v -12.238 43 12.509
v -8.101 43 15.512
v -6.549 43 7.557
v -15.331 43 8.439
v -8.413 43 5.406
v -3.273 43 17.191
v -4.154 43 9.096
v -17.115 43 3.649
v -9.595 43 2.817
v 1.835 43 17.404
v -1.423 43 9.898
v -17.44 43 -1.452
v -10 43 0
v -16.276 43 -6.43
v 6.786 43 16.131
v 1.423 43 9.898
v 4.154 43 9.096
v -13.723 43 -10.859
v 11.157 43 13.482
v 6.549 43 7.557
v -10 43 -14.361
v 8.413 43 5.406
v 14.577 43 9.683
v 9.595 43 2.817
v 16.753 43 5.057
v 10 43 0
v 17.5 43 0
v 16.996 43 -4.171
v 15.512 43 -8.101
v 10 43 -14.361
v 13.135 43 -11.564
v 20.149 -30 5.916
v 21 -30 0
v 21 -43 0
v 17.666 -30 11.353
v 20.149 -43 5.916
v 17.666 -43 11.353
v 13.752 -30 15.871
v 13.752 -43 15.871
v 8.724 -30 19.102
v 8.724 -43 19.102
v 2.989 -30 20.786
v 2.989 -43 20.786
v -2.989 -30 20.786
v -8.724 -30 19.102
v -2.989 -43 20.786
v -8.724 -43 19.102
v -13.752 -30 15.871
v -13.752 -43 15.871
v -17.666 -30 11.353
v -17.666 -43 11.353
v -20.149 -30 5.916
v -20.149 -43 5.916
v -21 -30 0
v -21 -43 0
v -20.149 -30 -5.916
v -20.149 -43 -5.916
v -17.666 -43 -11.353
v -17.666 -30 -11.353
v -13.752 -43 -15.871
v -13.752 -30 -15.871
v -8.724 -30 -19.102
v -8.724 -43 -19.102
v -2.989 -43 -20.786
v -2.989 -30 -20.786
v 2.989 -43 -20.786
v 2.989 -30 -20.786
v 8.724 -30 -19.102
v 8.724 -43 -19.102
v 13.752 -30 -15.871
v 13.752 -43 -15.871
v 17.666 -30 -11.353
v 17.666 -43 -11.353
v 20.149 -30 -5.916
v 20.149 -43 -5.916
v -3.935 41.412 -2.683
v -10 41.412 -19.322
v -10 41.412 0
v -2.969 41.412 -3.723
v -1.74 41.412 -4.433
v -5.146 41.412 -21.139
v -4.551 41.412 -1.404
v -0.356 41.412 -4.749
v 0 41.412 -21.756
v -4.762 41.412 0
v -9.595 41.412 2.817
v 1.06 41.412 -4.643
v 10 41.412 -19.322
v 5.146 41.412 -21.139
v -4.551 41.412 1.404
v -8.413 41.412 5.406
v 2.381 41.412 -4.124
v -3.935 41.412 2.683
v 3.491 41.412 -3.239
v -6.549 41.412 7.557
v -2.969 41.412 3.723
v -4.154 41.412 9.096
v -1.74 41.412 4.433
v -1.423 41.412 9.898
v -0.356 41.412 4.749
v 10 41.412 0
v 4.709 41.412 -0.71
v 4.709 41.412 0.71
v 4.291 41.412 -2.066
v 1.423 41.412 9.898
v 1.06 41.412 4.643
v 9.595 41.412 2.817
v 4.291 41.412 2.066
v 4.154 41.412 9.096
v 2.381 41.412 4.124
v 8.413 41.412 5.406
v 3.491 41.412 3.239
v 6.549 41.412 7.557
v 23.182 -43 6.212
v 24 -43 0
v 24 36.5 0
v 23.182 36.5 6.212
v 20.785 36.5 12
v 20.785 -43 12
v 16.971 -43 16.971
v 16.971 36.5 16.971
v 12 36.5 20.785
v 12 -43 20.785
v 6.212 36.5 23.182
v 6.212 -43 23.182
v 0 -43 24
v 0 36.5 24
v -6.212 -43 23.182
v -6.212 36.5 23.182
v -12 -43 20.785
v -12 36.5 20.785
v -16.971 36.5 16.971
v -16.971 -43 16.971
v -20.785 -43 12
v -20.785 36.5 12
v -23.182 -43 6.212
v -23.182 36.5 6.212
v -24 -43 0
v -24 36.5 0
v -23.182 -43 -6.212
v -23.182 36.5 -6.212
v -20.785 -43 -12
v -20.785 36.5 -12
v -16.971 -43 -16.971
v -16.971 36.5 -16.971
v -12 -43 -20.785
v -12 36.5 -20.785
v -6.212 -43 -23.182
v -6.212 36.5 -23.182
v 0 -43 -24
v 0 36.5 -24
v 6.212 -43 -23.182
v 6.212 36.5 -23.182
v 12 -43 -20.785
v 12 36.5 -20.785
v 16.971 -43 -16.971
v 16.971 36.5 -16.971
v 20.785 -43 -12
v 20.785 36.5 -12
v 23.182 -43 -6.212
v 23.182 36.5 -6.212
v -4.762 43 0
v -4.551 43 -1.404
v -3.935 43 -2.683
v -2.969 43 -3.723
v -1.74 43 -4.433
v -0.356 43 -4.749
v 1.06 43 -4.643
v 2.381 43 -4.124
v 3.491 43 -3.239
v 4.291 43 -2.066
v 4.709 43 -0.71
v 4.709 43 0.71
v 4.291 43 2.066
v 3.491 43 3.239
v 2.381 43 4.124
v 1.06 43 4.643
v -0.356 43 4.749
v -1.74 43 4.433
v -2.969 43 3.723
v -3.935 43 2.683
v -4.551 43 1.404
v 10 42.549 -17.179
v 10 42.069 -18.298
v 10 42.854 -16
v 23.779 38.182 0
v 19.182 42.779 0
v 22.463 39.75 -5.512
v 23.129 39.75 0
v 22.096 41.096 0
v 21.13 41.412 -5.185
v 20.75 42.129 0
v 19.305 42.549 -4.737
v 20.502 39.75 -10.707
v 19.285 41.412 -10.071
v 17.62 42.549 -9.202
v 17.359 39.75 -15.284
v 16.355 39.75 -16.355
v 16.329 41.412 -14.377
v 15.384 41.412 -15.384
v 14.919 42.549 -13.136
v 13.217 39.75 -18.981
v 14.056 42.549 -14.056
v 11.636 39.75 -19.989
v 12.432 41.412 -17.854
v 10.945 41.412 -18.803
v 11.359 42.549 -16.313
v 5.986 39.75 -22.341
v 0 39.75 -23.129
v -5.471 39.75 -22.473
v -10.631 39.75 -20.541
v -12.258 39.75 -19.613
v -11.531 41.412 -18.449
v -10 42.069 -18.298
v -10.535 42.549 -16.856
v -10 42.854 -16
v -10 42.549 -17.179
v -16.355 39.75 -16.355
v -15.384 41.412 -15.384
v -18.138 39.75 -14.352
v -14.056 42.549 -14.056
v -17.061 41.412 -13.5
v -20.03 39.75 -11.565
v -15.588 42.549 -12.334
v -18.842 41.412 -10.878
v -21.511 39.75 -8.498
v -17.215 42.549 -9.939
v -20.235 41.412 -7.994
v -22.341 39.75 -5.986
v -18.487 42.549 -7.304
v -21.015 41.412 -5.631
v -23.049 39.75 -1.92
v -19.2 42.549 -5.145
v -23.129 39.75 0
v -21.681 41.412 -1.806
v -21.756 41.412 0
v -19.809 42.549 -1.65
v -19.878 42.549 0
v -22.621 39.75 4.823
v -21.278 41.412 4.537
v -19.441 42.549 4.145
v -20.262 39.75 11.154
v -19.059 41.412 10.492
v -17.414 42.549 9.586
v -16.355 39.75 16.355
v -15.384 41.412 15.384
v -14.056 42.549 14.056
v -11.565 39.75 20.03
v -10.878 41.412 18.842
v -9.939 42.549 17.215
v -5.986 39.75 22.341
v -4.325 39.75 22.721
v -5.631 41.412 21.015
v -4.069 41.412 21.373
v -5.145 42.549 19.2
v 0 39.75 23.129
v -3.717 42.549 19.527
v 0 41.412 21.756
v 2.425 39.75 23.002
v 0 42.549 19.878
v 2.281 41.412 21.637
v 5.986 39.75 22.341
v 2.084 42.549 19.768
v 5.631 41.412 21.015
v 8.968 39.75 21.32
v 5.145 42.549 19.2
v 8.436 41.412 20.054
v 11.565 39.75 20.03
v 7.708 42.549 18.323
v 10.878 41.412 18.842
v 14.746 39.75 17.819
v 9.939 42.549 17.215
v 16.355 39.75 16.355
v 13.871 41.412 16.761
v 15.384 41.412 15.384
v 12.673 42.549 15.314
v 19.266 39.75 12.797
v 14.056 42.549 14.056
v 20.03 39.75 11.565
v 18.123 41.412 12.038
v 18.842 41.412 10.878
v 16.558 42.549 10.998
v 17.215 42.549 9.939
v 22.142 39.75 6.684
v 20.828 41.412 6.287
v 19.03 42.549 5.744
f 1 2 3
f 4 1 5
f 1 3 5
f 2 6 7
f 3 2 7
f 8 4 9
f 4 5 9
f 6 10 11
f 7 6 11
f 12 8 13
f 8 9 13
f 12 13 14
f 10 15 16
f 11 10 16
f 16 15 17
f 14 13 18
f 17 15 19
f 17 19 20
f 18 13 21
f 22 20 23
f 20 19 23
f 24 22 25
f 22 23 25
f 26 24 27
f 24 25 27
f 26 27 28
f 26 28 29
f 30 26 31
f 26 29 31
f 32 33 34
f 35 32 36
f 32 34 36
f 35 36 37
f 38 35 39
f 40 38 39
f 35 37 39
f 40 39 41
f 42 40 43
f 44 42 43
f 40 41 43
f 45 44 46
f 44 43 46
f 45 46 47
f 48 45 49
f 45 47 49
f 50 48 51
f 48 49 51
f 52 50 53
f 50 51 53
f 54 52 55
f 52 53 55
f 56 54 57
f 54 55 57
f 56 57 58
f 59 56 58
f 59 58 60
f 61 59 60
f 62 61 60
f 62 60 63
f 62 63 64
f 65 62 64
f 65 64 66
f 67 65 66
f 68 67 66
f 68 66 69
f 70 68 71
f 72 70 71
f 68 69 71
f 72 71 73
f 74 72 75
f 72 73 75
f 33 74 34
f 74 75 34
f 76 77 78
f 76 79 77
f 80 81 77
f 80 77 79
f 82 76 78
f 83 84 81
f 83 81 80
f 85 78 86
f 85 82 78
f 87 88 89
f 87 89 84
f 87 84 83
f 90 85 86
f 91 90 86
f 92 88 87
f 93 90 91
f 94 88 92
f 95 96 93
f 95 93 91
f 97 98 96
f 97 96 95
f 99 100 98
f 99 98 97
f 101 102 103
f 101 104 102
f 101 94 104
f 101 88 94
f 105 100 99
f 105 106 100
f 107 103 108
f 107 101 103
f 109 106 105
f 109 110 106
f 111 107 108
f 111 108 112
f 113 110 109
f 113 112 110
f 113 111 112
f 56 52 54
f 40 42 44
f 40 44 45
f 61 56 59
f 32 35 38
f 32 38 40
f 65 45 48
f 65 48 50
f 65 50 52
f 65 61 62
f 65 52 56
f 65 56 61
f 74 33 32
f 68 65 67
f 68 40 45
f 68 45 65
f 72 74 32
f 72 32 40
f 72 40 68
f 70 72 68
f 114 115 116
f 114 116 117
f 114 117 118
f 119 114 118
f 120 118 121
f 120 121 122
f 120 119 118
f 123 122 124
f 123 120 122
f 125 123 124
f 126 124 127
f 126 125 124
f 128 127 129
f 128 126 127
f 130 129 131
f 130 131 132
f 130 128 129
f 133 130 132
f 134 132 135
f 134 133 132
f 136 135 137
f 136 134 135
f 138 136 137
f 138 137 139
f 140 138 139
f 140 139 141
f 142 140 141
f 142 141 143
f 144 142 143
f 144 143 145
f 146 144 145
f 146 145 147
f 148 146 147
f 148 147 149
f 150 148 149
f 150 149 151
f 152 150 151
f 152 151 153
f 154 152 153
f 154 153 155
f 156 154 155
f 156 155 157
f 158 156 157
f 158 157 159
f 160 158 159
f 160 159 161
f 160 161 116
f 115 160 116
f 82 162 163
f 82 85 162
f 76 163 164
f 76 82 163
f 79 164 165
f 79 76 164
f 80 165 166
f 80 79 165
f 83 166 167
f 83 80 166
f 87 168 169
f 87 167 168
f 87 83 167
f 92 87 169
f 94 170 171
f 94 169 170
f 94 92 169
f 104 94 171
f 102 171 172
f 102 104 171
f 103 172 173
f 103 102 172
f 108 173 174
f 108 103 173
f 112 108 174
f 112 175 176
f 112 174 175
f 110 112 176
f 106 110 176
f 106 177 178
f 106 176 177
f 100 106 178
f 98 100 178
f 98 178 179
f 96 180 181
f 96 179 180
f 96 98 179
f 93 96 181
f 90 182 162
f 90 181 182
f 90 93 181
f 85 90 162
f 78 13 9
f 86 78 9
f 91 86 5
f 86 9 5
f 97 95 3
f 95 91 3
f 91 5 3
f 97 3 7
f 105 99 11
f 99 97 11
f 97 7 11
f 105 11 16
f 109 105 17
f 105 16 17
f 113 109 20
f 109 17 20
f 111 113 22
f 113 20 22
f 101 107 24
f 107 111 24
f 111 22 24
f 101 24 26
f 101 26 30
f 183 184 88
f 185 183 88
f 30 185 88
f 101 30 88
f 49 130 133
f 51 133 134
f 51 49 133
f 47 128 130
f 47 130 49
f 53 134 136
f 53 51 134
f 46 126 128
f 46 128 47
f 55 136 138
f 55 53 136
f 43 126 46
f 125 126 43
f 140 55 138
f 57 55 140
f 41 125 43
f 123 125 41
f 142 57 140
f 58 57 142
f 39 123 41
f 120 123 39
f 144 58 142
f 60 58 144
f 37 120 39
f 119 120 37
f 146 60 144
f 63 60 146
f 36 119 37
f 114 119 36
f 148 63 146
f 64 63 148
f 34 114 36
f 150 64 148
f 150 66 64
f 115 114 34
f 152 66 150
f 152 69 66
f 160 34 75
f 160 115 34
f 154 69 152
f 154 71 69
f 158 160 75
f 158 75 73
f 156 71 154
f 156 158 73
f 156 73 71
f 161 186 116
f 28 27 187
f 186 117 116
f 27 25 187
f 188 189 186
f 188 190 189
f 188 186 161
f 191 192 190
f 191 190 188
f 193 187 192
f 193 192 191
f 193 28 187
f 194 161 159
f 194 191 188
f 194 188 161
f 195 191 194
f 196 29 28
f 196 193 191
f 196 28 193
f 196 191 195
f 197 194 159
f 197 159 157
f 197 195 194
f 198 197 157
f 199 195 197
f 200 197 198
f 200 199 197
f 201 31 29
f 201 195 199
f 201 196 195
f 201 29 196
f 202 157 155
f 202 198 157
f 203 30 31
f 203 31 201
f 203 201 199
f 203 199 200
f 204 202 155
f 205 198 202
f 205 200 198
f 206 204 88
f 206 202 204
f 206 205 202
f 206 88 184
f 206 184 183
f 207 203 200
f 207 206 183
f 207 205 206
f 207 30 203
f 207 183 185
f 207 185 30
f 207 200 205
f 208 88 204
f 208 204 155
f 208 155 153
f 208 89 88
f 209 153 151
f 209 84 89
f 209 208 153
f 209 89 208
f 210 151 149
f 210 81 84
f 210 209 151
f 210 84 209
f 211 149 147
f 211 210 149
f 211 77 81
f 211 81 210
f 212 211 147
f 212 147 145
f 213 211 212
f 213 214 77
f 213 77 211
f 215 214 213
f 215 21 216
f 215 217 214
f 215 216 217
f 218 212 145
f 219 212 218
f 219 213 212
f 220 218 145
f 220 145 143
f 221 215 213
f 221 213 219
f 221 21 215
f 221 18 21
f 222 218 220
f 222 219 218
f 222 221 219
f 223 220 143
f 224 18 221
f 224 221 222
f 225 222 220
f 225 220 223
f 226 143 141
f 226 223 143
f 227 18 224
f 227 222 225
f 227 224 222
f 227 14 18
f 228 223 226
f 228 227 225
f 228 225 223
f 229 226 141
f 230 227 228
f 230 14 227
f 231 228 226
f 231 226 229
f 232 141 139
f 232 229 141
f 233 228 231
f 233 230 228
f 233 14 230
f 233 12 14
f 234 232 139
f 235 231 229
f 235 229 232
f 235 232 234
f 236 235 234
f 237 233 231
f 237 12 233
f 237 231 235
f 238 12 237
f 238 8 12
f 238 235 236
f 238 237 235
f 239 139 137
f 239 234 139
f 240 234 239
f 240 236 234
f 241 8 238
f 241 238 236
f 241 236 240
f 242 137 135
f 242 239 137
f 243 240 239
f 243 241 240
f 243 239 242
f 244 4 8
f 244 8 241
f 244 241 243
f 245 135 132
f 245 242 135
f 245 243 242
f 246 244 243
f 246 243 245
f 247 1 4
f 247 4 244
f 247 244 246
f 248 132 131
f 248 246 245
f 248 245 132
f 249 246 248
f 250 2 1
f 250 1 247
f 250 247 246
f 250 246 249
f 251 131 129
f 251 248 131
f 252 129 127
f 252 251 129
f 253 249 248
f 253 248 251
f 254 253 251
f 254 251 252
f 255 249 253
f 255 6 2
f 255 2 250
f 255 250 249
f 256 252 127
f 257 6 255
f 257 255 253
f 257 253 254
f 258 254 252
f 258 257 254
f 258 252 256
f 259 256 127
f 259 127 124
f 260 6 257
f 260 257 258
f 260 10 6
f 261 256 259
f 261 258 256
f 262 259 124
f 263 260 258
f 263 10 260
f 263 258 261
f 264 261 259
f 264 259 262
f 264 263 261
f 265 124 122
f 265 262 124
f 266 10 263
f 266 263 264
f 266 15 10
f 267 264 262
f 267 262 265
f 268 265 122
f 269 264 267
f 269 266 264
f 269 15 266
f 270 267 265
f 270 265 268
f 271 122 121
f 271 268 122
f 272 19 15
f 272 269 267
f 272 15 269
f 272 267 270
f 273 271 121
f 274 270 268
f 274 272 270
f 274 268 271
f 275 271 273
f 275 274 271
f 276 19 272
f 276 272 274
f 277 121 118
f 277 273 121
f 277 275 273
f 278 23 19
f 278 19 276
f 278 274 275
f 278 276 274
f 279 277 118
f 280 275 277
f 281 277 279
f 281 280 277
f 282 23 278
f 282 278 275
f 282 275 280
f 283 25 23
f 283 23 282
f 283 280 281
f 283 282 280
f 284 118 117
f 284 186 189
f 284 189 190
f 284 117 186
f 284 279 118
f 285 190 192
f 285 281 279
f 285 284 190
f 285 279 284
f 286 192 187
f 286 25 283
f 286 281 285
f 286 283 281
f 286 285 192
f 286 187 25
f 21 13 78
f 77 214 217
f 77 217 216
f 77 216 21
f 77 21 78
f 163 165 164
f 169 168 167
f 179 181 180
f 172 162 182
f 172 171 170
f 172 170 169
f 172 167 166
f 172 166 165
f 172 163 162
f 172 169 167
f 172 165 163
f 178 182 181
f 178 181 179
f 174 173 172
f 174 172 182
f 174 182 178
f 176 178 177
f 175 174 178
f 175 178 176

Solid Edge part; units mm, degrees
sketch "Sketch1" plane through (0, 0, 0) normal (0, -1, 0) x (1, 0, 0)
  circle A0 centre (0, 0) radius 24
  dimension "D1" = 48
extrude "Protrusion1" add sketch "Sketch1" along normal mid plane 86
fillet "Round1" radius 6.5 1 edges at (-24, 43, 0)
sketch "Sketch2" plane through (0, 43, 0) normal (0, 1, 0) x (-1, 0, 0)
  line L0 (-10, 0) -> (-10, -16)
  arc A0 (-10, 0) -> (10, 0) centre (0, 0) cw
  line L1 (10, 0) -> (10, -16)
  dimension "D1" = 10
  dimension "D2" = 16
extrude "Cutout1" cut sketch "Sketch2" against normal blind 1.5875 material side at (9.95, 43, -8)
sketch "Sketch3" plane through (0, 41.4125, -6.0688) normal (0, 1, 0) x (-1, 0, 0)
  circle A0 centre (0, 6.0688) radius 4.7625
  dimension "D1" = 9.525
extrude "Protrusion2" add sketch "Sketch3" along normal blind 1.5875
sketch "Sketch4" plane through (0, -43, 0) normal (0, -1, 0) x (1, 0, 0)
  circle A0 centre (0, 0) radius 21
  dimension "D1" = 3
extrude "Cutout2" cut sketch "Sketch4" against normal blind 13
properties part number "COIL-X1A" material "PURCHASED"
